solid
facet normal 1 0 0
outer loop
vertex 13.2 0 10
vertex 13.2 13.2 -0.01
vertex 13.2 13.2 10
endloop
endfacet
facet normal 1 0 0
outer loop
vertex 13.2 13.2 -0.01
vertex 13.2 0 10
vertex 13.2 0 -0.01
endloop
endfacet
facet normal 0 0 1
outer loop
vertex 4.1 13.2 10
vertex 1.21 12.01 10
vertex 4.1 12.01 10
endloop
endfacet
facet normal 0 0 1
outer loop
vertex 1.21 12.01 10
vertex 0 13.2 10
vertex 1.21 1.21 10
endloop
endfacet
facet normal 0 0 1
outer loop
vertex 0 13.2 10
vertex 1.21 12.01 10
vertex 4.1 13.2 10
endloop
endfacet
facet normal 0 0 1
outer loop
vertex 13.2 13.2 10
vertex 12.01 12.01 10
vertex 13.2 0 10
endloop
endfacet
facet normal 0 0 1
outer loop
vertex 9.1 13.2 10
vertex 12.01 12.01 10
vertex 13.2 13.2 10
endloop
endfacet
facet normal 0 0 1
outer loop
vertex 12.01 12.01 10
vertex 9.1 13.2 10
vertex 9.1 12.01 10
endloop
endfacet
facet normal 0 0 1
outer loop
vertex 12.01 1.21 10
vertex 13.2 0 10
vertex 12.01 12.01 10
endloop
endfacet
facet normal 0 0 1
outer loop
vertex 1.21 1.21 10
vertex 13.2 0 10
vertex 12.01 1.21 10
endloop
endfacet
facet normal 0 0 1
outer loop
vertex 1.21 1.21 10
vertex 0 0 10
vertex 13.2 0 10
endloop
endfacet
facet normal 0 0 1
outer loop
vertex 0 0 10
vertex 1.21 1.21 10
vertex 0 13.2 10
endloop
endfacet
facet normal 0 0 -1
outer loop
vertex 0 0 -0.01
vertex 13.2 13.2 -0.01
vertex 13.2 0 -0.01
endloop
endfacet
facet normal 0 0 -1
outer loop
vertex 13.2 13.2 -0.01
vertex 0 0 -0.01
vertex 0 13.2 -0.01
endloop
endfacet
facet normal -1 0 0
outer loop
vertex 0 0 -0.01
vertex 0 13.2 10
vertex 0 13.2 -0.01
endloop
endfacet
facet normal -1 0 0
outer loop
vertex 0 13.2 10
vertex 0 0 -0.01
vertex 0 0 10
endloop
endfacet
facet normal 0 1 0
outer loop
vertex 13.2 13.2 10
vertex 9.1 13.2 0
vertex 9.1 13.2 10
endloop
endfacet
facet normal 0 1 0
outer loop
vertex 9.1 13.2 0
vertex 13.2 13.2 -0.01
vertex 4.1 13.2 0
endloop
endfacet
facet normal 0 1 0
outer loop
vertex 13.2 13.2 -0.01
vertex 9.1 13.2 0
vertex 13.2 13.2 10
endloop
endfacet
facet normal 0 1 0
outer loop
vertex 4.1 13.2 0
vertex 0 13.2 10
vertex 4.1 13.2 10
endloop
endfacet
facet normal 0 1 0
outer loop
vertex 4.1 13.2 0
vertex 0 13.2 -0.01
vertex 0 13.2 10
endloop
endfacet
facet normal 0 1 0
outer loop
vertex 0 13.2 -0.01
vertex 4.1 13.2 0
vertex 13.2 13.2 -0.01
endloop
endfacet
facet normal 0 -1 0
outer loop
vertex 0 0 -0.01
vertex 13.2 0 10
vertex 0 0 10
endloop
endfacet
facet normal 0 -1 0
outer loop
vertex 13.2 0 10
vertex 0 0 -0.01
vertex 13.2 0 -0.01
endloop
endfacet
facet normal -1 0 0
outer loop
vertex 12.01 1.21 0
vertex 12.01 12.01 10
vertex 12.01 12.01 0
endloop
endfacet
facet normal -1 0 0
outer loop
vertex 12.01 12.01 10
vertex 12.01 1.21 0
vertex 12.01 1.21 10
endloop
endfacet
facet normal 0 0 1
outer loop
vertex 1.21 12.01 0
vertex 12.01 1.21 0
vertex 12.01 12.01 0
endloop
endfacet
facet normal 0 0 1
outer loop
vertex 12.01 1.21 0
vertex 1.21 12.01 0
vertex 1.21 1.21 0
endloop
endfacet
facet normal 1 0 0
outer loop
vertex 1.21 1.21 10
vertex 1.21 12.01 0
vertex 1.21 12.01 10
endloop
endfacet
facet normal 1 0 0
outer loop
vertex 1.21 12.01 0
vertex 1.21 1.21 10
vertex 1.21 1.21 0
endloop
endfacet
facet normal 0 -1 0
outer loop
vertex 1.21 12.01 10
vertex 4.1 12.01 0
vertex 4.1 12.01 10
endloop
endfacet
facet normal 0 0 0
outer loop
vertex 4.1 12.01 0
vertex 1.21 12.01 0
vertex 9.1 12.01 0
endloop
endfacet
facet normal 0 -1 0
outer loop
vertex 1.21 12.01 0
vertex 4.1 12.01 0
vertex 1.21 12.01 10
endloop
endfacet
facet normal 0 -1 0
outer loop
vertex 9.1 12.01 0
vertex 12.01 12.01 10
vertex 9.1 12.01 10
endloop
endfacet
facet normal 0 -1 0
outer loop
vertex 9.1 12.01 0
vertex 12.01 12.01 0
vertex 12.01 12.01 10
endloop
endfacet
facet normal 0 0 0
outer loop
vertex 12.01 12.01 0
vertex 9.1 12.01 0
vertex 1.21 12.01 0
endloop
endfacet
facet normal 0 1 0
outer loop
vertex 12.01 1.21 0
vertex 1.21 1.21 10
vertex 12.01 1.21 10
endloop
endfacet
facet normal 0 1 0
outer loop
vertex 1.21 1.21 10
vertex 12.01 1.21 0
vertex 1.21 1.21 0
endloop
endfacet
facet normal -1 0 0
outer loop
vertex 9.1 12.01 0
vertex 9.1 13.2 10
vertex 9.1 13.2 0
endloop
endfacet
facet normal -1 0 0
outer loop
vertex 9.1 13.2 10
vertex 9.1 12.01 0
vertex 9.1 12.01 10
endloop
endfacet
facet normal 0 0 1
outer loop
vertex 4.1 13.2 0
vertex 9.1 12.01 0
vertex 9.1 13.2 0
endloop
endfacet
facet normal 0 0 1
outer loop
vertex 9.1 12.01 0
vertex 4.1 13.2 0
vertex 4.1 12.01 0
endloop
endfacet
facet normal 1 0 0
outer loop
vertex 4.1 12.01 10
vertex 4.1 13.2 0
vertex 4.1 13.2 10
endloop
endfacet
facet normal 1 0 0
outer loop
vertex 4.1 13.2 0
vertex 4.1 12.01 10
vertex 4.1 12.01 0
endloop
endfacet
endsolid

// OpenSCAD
// file: ../../Base/Rotation.scad
// Fischertechnik Box Foundation
// Geometry Helpers Rotation

include <PlacementOptions.scad>

// getRotatedSpace(space, rotation=NoRotation)
// Rotates the space dependent on the specified rotation

function getRotatedSpace(space, rotation=NoRotation) = [
    (rotation == Rotate90 || rotation == Rotate270) ? space.y : space.x,
    (rotation == Rotate90 || rotation == Rotate270) ? space.x : space.y
];

// Rotates the given space around the fixed left lower corner
// space = the space the children needs as width/depth list [width,depth]
// rotation = 0 Rotate0 degrees, 1 Rotate90 degrees, 2 Rotate180 degrees, 3 Rotate270 degrees (equivalent to -90)

module RotateFix(space, rotation=NoRotation) {
    dy = (rotation == Rotate0 || rotation == Rotate270) ? 0 :
        (rotation == Rotate90) ? space.x :
        space.y;
    dx = (rotation < Rotate180) ? 0 :
        (rotation == Rotate180) ? space.x :
        space.y;
    
    translate([dx, dy, 0])
        rotate([0, 0, rotations[rotation]])
            children();
}
// file: ../../Base/Alignment.scad
// Fischertechnik Box Foundation
// Geometry Helpers Alignment

include <PlacementOptions.scad>

// getAlignedX(elementWidth, spaceWidth, align=AlignRight, offset=0)
// Gets the aligned X offset of an element with the given
// width in the given space.
// elementWidth = The width of the element to positon
// spaceWidth = The space where the element should be aligned
// align = 0 AlignLeft, 1 AlignCenter, 2 AlignRight
// offset = an optional offset from the aligned position. When
// aligned left or centered, then positive values are in X direction.
// When aligned right then positive values are in negative X direction.

function getAlignedX(elementWidth, spaceWidth, align=AlignRight, offset=0) =
    (align == AlignLeft) ?
        offset :
        ((align == AlignCenter) ?
        (spaceWidth - elementWidth)/2 + offset :
        spaceWidth - offset - elementWidth);

// getAlignedY(elementDepth, spaceDepth, align=AlignTop, offset=0)
// Gets the aligned Y offset of an element with the given
// depth in the given space.
// elementDepth = The depth of the element to positon
// spaceDepth = The space where the element should be aligned
// align = 0 AlignBottom, 1 AlignCenter, 2 AlignTop
// offset = an optional offset from the aligned position. When
// aligned bottom or centered, then positive values are in Y direction.
// When aligned top then positive values are in negative Y direction.

function getAlignedY(elementDepth, spaceDepth, align=AlignTop, offset=0) =
    (align == AlignBottom) ?
        offset :
        ((align == AlignCenter) ?
        (spaceDepth - elementDepth)/2 + offset :
        spaceDepth - offset - elementDepth);
// file: ../../Base/PlacementOptions.scad
// Fischertechnik Box Foundation
// Placement Options

// Alignment
NoAlign = 0;
AlignLeft = 1;
AlignBottom = 2;
AlignCenter = 3;
AlignRight = 4;
AlignTop = 5;

// Element rotation degree steps
rotations = [0, -90, -180, -270];

// Rotation
NoRotation = 0;
Rotate0 = 0;
Rotate90 = 1;
Rotate180 = 2;
Rotate270 = 3;

// Docking (seen from above)
NoDock = -1;
DockLeft = 0;
DockTop = 1;
DockRight = 2;
DockCorner = 2;
DockBottom = 3;

// Web corners
LowerLeft = 0;
UpperLeft = 1;
UpperRight = 2;
LowerRight = 3;

// Web position relative to corner
LeftOfCorner = 0;
RightOfCorner = 1;
// file: ../../Base/Boxes.scad
// Fischertechnik Box Foundation
// Pre-designed Boxes

use <Constants.scad>

include <PlacementOptions.scad>

box190Width = 190;
box190Depth = 130;
box130Width = 130;
box130Depth = 95;

// Values are from an original ec3 box
topBottomDifference = 1.5;
outerHeight = 40;
baseThickness = 1.8;
innerHeight = outerHeight - baseThickness;
stackExcess = 5.7;
radius = 3.5;
wallThickness = 1.5;
tolerance = 0.2;

boxWallThickness = wallThickness;
boxBaseThickness = baseThickness;
boxWebWidth = 3.0;

// getBoxWallThickness()
// Gets the wall thickness of a Fischertechnik Box
function getBoxWallThickness() = boxWallThickness;

// getBoxUsageHeight(height = 38.2)
// Gets the usable height of a Fischertechnik box
// height = Outer height of the box from the bottom to the upper edge.
function getBoxUsageHeight(height = outerHeight) = height - baseThickness - stackExcess;

// getBoxInnerHeight()
// Gets the inner height of a Fischertechnik box, including the stack excess
function getBoxInnerHeight() = innerHeight;

// getBoxBaseThickness()
// Gets the thickness of the Fischertechnik box base.
function getBoxBaseThickness() = boxBaseThickness;

// getBoxWebWidth()
// Gets the width of a box web
function getBoxWebWidth() = boxWebWidth;

// getBox190Space()
// Gets the usable inner space of a Box 190 as an x/y-list
function getBox190Space() = [
    box190Width - 2*getBoxWallThickness() - topBottomDifference, 
    box190Depth - 2*getBoxWallThickness() - topBottomDifference ];

// RoundedCornerPlate(width, depth, height, radius)
// Creates a body plate with rounded corners for a box. Used
// also to create the complete box with the hull module.
// width = Width of the plate
// depth = depth of the plate 
// height = thickness of the plate
// radius = radius of the rounded corner
module RoundedCornerPlate(width, depth, height, radius) {
    translate([radius, radius])
    hull() {
        w = width-2*radius;
        d = depth-2*radius;
        cube([w, d, height]);
        cylinder(height, r=radius, $fn=getFragments());
        translate([w, 0])
            cylinder(height, r=radius, $fn=getFragments());
        translate([w, d])
            cylinder(height, r=radius, $fn=getFragments());
        translate([0, d])
            cylinder(height, r=radius, $fn=getFragments());
    }
}

// BoxBase(width, depth)
// Creates an empty stackable Fischertechnik compatible box
// width = Outer width of the box (190, 130, ...)
// depth = Outer depth of the box (130, 95, ...)

module BoxBase(width, depth, height=outerHeight) {    
    thinPlate = 0.01;

    innerHeight = height - baseThickness;    
    
    module Body(tolerance=tolerance) {
        hull() {
            // Bottom with tolerance to fit into the original boxes when stacked
            translate([-wallThickness+tolerance, -wallThickness+tolerance, -baseThickness])
                RoundedCornerPlate(width-topBottomDifference-2*tolerance, depth-topBottomDifference-2*tolerance, thinPlate, radius);
            
            // Top
            translate([-wallThickness-topBottomDifference/2, -wallThickness-topBottomDifference/2, innerHeight-thinPlate])
                RoundedCornerPlate(width, depth, thinPlate, radius);
         }
    }

    module Cutoff() {
        hull() {
            coWidth = width - 2*wallThickness;
            coDepth = depth - 2*wallThickness;
            
            // Bottom
            RoundedCornerPlate(coWidth-topBottomDifference, coDepth-topBottomDifference, thinPlate, radius);

            // Top
            translate([-topBottomDifference/2, -topBottomDifference/2, innerHeight+thinPlate]) 
                RoundedCornerPlate(coWidth, coDepth, thinPlate, radius);
        }
    }
    
    difference() {        
        Body();
        Cutoff();
        stackOffset = innerHeight - stackExcess;
        translate([0, 0, stackOffset + baseThickness])
            Body(tolerance=0);
    }
}

// Creates the Fischertechnik empty box 130x190 mm and places it at position 0,0
// 190x130 are the outer sizes, the inner space is slightly smaller. Use getBox190Space() to get the inner sizes.
// The box is positioned that the usable inner space is at the 0,0,0 position.

module Box190() {
    BoxBase(box190Width, box190Depth);
}

// Gets the usable inner space of a Box 130 as an x/y-list
function getBox130Space() = [
    box130Width - 2*getBoxWallThickness() - topBottomDifference, 
    box130Depth - 2*getBoxWallThickness() - topBottomDifference ];

// Creates the Fischertechnik empty box 95x130 mm and places it at position 0,0
// 190x130 are the outer sizes, the inner space is slightly smaller. Use getBox190Space() to get the inner sizes.
// The box is positioned that the usable inner space is at the 0,0,0 position.

module Box130() {
    BoxBase(box130Width, box130Depth);
}

// Creates a web at the specified box walls
// corner 0 = LowerLeft, 1 = UpperLeft, 2 = UpperRight, 3 = LowerRight
// side 0 = LeftOfCorner, 1 = RightOfCorner
// distance = Distance in mm from the corner
// boxSpace = inner width and depth of the box (default: Box 190)
// webWidth = length of the web (default is 3 mms)
// webThickness = thickness of the web (default is 1 mm)
// height = Height of the web (standard is getBoxUsageHeight())
// sink = How much of the web is sunk into the wall

module BoxWeb(
    corner, 
    side, 
    distance, 
    boxSpace=getBox190Space(), 
    webWidth=getBoxWebWidth(), 
    webThickness=1.0, 
    height=getBoxUsageHeight(),
    sink = getBoxWallThickness()/2) {
    width = (corner % 2 == 0) ? 
            (side == LeftOfCorner ? webWidth : webThickness) :
            (side == LeftOfCorner ? webThickness : webWidth);

    depth = (corner % 2 == 0) ? 
            (side == RightOfCorner ? webWidth : webThickness) :
            (side == RightOfCorner ? webThickness : webWidth);
    
    xDiff = corner == LowerLeft ? 
                (side == LeftOfCorner ? -sink : distance) :
            (corner == UpperLeft ?                
                (side == LeftOfCorner ? distance : -sink) :
            (corner == UpperRight ?
                (side == LeftOfCorner ? boxSpace.x-webWidth+sink : boxSpace.x-distance-webThickness) :
                (side == LeftOfCorner ? boxSpace.x-distance-webThickness: boxSpace.x-webWidth+sink)));

    yDiff = corner == LowerLeft ? 
                (side == RightOfCorner ? -sink : distance) :
            (corner == UpperLeft ?
                (side == RightOfCorner ? boxSpace.y-distance-webThickness : boxSpace.y-webWidth+sink) :
            (corner == UpperRight ?
                (side == RightOfCorner ? boxSpace.y-webWidth+sink : boxSpace.y-distance-webThickness) :
                (side == RightOfCorner ? distance : -sink)));
    
    translate([xDiff, yDiff, -getExcess()])
        cube([width, depth, height + 2*getExcess()]);
}
// file: ../../Base/Placement.scad
// Fischertechnik Box Foundation
// Geometry Helpers Placement

use <Constants.scad>
use <Alignment.scad>
use <Rotation.scad>
use <Boxes.scad>

include <PlacementOptions.scad>

// Place(x=0, y=0, elementSpace=[0,0], alignX=AlignLeft, alignY=AlignBottom, rotation=Rotate0, boxSpace=getBox190Space())
// Places the child at the specified position
// y = Y-Position. This is a relative position when an X aligment is specified.
// x = X-Position. This is a relative position when an Y aligment is specified.
// elementSpace = space of the element to be placed [x,y]
// alignX = -1=NoAlign, 0 AlignLeft, 1 AlignCenter, 3 AlignRight (elementSpace and boxSpace required!)
// alignY = -1=NoAlign, 2 AlignBottom, 1 AlignCenter, 4 AlignTop (elementSpace and boxSpace required!)
// rotation = 0 Rotate0 0 degrees, 1 Rotate90 90 degrees, 
// 2 Rotate180 180 degrees, 3 Rotate270 270 degrees (equivalent to -90)
// boxSpace = Inner space of the box where the placement occurs [x,y] - default is Box 190x130 inner space

module Place(x=0, y=0, elementSpace=[0,0], 
  alignX=AlignLeft, alignY=AlignBottom, 
  rotation=NoRotation, boxSpace=getBox190Space()) {

    module Position(x, y, space, rotation=Rotate0) {
        translate([x, y, 0])
            RotateFix(space, rotation)
                children();
    }

    space = getRotatedSpace(elementSpace, rotation);
    alignedX = getAlignedX(space.x, boxSpace.x, alignX, x);
    alignedY = getAlignedY(space.y, boxSpace.y, alignY, y);
    Position(alignedX, alignedY, elementSpace, rotation)
        children();
}

// Center(space=getBox130Space(), elementSpace=[0,0])
// space = Space where the children is centered. For cylinder use centered=true and no elementSpace.
// elementSpace = space of the element to be centered [x,y]

module Center(space=getBox190Space(), elementSpace=[0,0]) {
    Place(elementSpace=elementSpace, boxSpace=space, alignX=AlignCenter, alignY=AlignCenter)
        children();
}

// CenterHorizontal(width=0, y=0, offset=0, space=getBox130Space())
// width = Width of the element to be placed.
// y = Y position of the element
// offset = Offset from the center position (negative will be left of the center)
// space = Space where the element is placed

module CenterHorizontal(width=0, y=0, offset=0, space=getBox190Space()) {
    Place(x=offset, y=y, elementSpace=[width, 0], boxSpace=space, alignX=AlignCenter)
        children(0);
}

// CenterVertical(depth=0, x=0, offset=0, space=getBox130Space())
// depth = Depth of the element to be placed.
// x = X position of the element
// offset = Offset from the center position (negative will be down of the center)
// space = Space where the element is placed

module CenterVertical(depth=0, x=0, offset=0, space=getBox190Space()) {
    Place(x=x, y=offset, elementSpace=[0, depth], boxSpace=space, alignY=AlignCenter)
        children(0);
}

// getIsVertical(align)
// True if the specified alignment needs a vertical orientation for a divider (AlignRight, AlignLeft)

function getIsVertical(align) = (align == AlignRight || align == AlignLeft);

// getIsHorizontal(align)
// True if the specified alignment needs a horizontal orientation for a divider (AlignTop, AlignBottom)

function getIsHorizontal(align) = (align == AlignTop || align == AlignBottom);
// file: ../../Base/Constants.scad
// Fischertechnik Box Foundation
// Constants

// Constant values necessary for multiple elements

// Base constants
dividerThickness = 1.2;
excess = 0.01;
fragments = 90;
tolerance = 0.8;

// Gets the thickness of a divider 
function getDividerThickness() = dividerThickness;

// Gets the excess that is used to merge walls into each other
function getExcess() = excess;

// Gets amount of fragments of a cylinder
function getFragments() = fragments;

// Gets the inner tolerance of a frame to each side
function getTolerance() = tolerance;


// Fischertechnik specific constants
axisDiameter = 4;
axisBottomDiameter = axisDiameter + 1;
axisTolerance = 0.2;

// Gets axis diameter of Fischertechnik axis
function getAxisDiameter() = axisDiameter;

// Gets axis diameter tolerance (subtracted for element axis)
function getAxisTolerance() = axisTolerance;

// Gets the axis diameter for standing axis
function getStandAxisDiameter() = getAxisDiameter() - getAxisTolerance();

// Gets axis bottom diameter for thicker part at the bottom
function getAxisBottomDiameter() = axisBottomDiameter;

pinHeight = 2.5;

// gets the height of a connecting pin
function getPinHeight() = pinHeight;

standardEdgeDistance = 2.5;
standardWebDistance = 11.5;
standardCornerLength = 15;

// gets the standard distance to the wall of the box for dockable frames with webs
function getStandardEdgeDistance() = standardEdgeDistance;

// gets the standard distance of each web to the corner of the dockable frame
function getStandardWebDistance() = standardWebDistance;

// gets the standard length of the corner walls of a dockable frame
function getStandardCornerLength() = standardCornerLength;

tubeWallFactor = 0.8;

// gets the wall thickness of a tube.
function getTubeWallThickness() = tubeWallFactor * getDividerThickness();

smallPartsFrameHeight = 20;

// gets the frame height for docked small parts boxes.
function getSmallPartsFrameHeight() = smallPartsFrameHeight;

hubRingDiameter = 19.5;
hubRingLevelDiameter = 21;

// gets the diameter of a tube matching the inner ring of a wheel
function getHubRingDiameter() = hubRingDiameter;

// gets the diameter of a hub tube with a thicker diameter
function getHubRingLevelDiameter() = hubRingLevelDiameter;
// main file
// Fischertechnik Box Foundation
// ModelBase
// Test FrameTopCutoff

use <../../Base/Constants.scad>
use <../../ModelBase/Simple.scad>

cutoffWidth = 5;
offset = 0;

difference() {
    Frame([10,10,10]);
    FrameTopCutoff([10,10,10], cutoffWidth, offset);
}
